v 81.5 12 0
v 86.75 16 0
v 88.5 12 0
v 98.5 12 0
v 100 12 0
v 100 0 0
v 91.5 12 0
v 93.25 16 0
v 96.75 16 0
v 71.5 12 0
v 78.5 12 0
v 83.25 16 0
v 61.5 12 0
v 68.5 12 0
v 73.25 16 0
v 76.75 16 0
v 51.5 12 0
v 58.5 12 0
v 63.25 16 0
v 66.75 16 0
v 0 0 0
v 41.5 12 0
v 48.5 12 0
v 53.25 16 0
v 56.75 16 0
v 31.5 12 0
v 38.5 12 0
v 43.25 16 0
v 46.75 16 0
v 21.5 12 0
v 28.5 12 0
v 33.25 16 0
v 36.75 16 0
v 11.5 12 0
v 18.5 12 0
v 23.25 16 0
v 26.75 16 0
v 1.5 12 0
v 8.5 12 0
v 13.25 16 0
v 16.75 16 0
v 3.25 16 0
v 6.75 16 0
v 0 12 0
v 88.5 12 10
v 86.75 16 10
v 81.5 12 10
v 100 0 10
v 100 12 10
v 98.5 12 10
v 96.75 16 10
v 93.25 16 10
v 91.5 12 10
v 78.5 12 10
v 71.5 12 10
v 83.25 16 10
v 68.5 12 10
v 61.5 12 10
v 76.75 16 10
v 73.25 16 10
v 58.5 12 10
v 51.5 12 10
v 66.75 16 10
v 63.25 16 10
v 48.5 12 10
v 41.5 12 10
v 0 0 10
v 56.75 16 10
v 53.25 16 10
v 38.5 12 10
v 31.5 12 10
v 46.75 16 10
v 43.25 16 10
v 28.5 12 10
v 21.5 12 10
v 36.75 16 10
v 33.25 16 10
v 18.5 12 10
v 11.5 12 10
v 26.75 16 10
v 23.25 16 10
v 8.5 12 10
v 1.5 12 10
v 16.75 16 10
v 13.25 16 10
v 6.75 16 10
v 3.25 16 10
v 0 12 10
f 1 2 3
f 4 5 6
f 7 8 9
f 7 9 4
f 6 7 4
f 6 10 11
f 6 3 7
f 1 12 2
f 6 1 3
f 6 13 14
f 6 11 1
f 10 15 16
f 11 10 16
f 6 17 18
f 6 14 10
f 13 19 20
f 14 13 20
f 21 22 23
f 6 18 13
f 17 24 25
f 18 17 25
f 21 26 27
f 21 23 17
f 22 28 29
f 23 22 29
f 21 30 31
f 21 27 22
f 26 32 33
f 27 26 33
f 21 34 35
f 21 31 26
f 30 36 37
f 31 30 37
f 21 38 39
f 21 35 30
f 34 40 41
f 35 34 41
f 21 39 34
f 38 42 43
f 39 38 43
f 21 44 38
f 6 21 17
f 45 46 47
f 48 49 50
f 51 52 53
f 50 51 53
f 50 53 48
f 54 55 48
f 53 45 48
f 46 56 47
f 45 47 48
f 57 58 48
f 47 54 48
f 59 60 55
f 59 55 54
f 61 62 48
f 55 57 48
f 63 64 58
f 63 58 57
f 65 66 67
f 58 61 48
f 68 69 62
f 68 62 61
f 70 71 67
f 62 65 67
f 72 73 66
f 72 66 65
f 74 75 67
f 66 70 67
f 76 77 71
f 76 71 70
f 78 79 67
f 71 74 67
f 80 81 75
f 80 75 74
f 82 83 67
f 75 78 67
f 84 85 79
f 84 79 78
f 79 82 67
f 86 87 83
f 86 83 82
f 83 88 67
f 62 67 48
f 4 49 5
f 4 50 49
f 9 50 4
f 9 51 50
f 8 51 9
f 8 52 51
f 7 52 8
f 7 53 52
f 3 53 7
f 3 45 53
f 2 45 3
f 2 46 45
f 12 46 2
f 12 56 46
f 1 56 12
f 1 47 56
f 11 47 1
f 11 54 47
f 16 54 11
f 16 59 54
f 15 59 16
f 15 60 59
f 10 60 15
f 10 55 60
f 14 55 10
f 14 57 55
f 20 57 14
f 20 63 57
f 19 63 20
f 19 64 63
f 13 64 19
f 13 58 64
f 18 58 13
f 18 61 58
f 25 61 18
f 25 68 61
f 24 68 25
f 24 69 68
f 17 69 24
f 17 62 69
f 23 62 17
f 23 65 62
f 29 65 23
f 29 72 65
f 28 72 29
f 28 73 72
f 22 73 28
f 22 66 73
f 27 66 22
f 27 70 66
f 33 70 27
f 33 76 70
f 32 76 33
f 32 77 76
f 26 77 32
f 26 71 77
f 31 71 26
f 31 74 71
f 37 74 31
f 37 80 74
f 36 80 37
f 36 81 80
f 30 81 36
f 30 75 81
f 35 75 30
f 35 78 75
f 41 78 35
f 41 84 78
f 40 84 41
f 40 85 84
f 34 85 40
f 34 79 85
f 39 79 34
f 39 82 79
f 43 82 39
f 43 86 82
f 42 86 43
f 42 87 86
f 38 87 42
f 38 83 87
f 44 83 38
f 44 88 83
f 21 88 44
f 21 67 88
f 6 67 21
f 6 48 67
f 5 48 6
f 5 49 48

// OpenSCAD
$fn = 32;

// ----------------------------------------------------------------------
// Gear rack: 10 teeth, pitch 10 mm
// ----------------------------------------------------------------------

// --- parameters (mm) ---
teeth = 10;               // number of teeth
pitch = 10;               // tooth pitch, X
root_w = 7;               // tooth width at the root
tip_w = 3.5;              // tooth width at the tip
base_h = 12;              // rack body height, Y
tooth_h = 4;              // tooth height above the body
plate_t = 10;             // rack width, Z (extrusion height)

rack_l = teeth * pitch;  // overall length
total_h = base_h + tooth_h;  // overall height

profile = [[0, 0], [100, 0], [100, 12], [98.5, 12], [96.75, 16], [93.25, 16], [91.5, 12], [88.5, 12], [86.75, 16], [83.25, 16], [81.5, 12], [78.5, 12], [76.75, 16], [73.25, 16], [71.5, 12], [68.5, 12], [66.75, 16], [63.25, 16], [61.5, 12], [58.5, 12], [56.75, 16], [53.25, 16], [51.5, 12], [48.5, 12], [46.75, 16], [43.25, 16], [41.5, 12], [38.5, 12], [36.75, 16], [33.25, 16], [31.5, 12], [28.5, 12], [26.75, 16], [23.25, 16], [21.5, 12], [18.5, 12], [16.75, 16], [13.25, 16], [11.5, 12], [8.5, 12], [6.75, 16], [3.25, 16], [1.5, 12], [0, 12]];  // primary outline, 44 points, counter clockwise

// --- the one profile operation ---
linear_extrude(height = plate_t) polygon(points = profile);
